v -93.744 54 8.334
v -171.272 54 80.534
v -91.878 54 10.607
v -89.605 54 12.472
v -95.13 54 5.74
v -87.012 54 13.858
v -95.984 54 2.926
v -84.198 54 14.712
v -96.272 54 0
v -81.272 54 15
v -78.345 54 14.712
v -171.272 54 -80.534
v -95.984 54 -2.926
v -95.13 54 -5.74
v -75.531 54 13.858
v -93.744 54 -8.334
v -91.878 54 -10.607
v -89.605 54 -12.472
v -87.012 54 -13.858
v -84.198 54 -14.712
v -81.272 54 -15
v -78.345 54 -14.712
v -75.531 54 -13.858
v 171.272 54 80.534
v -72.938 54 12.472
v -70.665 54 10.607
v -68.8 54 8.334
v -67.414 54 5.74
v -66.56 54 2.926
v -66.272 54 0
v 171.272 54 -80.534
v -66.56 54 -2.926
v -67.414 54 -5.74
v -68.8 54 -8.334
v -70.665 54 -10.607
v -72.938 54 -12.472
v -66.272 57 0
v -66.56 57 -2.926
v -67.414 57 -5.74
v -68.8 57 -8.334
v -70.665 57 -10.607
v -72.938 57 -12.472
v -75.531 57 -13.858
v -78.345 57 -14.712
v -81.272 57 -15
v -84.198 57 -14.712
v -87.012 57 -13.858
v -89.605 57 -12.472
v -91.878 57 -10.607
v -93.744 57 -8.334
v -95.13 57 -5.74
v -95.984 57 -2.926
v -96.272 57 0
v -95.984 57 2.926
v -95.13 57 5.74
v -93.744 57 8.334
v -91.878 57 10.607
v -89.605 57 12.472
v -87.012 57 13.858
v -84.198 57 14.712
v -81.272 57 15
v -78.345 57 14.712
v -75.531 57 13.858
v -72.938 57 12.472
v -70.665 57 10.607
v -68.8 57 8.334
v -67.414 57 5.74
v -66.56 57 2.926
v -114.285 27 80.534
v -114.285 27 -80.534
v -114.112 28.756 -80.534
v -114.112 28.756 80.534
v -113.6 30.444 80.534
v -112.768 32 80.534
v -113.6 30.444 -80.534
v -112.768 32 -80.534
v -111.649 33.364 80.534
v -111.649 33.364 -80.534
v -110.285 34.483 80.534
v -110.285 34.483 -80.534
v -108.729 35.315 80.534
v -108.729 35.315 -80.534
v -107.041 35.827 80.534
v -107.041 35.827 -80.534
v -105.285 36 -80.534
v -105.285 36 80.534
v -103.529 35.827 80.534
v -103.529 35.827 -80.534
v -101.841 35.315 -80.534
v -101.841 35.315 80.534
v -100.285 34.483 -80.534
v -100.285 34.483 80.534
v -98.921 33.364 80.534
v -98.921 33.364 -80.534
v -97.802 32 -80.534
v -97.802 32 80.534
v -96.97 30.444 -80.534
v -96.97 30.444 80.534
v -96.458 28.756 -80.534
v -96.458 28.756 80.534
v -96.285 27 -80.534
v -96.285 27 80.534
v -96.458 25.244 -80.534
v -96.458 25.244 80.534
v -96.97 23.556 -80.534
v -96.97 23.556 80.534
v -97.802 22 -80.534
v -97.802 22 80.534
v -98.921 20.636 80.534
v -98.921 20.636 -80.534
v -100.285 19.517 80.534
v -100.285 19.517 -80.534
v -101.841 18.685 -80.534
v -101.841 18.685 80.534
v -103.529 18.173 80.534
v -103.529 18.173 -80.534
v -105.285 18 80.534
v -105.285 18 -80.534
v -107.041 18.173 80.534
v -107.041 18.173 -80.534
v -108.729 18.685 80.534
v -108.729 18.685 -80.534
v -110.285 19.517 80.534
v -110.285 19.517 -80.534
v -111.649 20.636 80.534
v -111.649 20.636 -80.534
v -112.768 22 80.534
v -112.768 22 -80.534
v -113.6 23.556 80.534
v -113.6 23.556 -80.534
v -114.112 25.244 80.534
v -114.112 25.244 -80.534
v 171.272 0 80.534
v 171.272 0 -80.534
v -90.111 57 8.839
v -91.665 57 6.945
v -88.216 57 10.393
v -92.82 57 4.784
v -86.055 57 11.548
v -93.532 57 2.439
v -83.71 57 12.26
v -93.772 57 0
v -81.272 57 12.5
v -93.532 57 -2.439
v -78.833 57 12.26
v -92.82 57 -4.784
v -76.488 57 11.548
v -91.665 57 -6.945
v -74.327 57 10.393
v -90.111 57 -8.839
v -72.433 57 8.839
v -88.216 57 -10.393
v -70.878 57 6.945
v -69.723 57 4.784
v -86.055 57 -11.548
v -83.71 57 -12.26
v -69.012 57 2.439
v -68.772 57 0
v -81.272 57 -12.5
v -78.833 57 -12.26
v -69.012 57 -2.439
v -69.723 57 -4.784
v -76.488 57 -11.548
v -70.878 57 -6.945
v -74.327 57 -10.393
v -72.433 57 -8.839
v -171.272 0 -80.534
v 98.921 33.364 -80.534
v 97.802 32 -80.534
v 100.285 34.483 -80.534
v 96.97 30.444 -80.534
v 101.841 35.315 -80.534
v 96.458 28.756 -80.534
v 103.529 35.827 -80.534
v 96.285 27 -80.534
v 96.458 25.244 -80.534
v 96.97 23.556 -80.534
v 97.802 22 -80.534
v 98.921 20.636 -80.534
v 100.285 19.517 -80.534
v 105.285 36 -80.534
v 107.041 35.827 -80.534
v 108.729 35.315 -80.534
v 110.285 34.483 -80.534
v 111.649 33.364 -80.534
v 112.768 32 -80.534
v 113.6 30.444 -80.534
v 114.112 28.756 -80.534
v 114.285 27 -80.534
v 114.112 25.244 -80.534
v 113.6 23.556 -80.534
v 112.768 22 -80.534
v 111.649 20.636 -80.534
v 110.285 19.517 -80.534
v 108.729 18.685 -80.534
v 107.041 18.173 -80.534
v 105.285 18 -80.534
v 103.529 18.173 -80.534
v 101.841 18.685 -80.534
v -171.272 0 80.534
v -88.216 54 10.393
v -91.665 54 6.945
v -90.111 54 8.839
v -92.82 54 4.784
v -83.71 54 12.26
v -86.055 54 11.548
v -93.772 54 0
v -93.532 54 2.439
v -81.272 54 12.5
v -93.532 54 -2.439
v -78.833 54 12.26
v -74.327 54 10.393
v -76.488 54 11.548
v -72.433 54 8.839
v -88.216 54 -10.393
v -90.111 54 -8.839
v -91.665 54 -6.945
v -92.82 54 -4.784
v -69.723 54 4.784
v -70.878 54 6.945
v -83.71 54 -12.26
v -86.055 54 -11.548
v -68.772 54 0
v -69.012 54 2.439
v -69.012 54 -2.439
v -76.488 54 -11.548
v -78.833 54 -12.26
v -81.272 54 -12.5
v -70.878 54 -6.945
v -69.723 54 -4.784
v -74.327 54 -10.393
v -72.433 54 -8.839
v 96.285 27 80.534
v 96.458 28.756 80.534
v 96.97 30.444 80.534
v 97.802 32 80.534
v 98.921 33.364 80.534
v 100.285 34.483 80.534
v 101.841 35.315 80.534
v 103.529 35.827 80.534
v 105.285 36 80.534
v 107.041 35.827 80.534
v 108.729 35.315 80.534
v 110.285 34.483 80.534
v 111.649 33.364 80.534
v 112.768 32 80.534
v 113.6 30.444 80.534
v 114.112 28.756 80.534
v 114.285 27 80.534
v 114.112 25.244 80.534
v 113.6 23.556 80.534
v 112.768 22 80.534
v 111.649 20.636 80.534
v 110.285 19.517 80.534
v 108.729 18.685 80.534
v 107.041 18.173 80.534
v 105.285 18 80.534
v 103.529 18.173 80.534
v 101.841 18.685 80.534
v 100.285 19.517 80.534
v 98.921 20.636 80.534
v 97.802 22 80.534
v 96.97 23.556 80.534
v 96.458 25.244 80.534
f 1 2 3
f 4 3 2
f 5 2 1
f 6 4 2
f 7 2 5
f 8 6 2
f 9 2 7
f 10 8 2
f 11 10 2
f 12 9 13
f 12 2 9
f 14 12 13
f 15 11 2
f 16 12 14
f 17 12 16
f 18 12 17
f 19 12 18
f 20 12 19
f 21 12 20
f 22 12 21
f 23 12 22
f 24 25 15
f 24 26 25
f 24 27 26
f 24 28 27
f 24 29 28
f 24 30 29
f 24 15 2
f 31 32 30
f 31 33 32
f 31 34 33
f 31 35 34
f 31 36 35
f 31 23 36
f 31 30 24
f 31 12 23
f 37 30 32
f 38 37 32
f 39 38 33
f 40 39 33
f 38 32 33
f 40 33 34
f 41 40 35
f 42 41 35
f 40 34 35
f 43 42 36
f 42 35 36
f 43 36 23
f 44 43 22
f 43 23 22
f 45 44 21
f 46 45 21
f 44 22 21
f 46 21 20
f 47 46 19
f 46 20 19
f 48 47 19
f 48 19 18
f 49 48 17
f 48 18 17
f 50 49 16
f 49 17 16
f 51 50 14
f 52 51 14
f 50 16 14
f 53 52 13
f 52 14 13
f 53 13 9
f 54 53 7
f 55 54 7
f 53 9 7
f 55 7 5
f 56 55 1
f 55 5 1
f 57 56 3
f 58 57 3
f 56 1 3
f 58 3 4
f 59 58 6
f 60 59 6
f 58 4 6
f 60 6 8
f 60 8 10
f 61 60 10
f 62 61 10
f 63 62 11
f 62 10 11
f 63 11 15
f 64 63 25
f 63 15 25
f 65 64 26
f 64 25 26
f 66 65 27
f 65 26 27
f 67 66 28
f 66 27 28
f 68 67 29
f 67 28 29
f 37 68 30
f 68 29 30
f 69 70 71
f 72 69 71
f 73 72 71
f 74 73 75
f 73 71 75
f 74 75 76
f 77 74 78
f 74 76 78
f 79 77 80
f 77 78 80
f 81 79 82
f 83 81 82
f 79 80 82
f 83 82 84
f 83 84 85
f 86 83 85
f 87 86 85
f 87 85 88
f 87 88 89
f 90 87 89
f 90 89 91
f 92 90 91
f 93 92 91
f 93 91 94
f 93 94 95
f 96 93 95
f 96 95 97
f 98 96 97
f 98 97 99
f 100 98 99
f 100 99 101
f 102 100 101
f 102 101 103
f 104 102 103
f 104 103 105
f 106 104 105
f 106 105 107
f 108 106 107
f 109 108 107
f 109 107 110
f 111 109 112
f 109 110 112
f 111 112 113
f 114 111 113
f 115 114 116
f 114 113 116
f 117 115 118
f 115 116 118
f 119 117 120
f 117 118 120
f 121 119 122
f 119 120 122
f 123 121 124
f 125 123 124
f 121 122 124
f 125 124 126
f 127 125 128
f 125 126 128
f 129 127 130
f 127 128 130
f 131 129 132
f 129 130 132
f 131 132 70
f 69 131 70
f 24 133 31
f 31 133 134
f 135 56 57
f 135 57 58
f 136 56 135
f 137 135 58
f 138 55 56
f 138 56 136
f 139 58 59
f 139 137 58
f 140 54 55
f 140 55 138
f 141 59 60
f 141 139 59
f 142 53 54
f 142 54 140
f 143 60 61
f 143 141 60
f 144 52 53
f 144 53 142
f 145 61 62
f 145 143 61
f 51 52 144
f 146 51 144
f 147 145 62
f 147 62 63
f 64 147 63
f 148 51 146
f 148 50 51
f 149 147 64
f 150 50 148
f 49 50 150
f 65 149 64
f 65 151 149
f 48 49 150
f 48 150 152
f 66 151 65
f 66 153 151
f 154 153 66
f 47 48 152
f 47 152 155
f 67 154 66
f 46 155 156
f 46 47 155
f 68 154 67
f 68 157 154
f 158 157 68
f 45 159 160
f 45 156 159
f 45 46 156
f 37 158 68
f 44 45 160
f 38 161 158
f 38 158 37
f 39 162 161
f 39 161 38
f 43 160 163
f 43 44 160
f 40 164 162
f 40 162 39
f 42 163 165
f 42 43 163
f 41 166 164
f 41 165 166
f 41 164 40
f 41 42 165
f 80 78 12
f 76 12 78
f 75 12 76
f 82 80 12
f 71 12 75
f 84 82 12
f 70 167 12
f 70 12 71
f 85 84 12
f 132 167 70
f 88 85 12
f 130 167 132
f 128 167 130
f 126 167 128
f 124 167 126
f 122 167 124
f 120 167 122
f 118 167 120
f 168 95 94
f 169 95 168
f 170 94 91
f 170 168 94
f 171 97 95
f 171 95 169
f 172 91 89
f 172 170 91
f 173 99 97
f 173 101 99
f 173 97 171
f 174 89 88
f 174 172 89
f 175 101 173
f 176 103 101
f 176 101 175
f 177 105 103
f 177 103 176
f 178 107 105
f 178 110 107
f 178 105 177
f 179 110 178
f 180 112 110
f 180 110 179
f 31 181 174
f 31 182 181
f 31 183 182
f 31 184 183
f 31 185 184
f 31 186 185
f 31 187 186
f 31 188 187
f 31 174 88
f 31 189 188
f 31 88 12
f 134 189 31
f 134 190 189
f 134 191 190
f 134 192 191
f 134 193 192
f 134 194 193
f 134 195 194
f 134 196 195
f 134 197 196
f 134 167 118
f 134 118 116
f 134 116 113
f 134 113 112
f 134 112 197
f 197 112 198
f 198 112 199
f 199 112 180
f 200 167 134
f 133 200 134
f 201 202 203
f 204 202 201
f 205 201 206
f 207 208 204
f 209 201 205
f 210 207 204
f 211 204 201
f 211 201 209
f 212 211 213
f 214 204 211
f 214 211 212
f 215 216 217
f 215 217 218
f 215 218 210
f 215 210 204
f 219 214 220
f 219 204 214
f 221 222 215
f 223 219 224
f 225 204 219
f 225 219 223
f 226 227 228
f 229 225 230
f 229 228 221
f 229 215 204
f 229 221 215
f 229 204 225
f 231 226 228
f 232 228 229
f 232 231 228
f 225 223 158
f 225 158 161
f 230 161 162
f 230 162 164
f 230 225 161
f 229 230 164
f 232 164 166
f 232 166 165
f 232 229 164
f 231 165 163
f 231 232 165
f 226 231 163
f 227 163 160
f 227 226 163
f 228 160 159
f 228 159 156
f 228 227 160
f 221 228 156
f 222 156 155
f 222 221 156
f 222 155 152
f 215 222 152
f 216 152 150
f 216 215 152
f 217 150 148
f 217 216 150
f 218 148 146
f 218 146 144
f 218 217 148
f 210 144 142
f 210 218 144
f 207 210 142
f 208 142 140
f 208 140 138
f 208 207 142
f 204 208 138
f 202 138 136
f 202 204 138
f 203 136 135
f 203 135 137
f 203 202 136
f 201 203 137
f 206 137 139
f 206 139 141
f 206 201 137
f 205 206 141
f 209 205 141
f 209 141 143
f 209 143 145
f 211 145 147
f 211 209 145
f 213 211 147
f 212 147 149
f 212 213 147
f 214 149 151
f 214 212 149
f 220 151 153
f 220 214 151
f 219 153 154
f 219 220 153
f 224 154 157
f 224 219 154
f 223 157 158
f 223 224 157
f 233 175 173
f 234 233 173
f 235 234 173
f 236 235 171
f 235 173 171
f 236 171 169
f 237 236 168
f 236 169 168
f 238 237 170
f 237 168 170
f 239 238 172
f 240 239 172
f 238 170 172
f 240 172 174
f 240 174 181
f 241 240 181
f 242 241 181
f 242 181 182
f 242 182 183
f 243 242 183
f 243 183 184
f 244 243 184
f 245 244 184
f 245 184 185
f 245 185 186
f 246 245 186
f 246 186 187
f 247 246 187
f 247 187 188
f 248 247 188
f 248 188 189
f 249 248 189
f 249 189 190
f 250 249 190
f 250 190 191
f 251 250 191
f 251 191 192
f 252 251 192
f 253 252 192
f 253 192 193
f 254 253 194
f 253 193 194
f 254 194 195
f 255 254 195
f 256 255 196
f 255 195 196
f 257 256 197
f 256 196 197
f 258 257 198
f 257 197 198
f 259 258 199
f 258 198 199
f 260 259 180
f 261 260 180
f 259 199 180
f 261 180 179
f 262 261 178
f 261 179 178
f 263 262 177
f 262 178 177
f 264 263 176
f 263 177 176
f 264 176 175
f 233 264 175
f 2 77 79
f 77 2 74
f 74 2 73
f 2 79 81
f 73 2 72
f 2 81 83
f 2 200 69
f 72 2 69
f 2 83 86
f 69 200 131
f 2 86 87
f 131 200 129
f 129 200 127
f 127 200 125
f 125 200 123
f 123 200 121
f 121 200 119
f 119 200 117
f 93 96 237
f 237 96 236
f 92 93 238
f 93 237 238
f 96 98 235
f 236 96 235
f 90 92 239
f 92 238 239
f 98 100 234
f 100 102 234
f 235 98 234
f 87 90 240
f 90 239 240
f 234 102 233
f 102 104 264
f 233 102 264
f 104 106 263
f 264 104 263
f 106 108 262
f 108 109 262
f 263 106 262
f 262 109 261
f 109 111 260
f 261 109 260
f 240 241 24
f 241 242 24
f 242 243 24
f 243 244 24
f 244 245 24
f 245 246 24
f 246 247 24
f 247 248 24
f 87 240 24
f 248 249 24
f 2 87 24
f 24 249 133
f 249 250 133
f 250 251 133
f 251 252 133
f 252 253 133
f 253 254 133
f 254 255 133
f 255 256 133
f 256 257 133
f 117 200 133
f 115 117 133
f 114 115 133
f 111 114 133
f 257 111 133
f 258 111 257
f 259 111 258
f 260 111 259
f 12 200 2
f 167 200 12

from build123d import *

# Parameters (mm, degrees)
SKETCH1_W           = 342.543491
SKETCH1_H           = 161.067786
BOSS_EXTRUDE1_DEPTH = 54
SKETCH3_R           = 9
CUT_EXTRUDE1_DEPTH  = 340.02
SKETCH4_R           = 15
SKETCH4_R_2         = 12.5
BOSS_EXTRUDE2_DEPTH = 3


with BuildPart() as part:
    # Sketch1 → Boss-Extrude1 (new body)
    with BuildSketch(Plane(origin=(0, 0, 0), x_dir=(1, 0, 0), z_dir=(0, 1, 0))):
        Rectangle(SKETCH1_W, SKETCH1_H)
    extrude(amount=BOSS_EXTRUDE1_DEPTH)

    # Sketch3 → Cut-Extrude1 (cut)
    with BuildSketch(Plane(origin=(0, 0, -80.533893), x_dir=(-1, 0, 0), z_dir=(0, 0, -1))):
        with Locations((-105.2849429, 27)):
            Circle(SKETCH3_R)
        with Locations((105.2849429, 27)):
            Circle(SKETCH3_R)
    extrude(amount=-CUT_EXTRUDE1_DEPTH, mode=Mode.SUBTRACT)

    # Sketch4 → Boss-Extrude2 (add)
    with BuildSketch(Plane(origin=(0, 54, 0), x_dir=(1, 0, 0), z_dir=(0, 1, 0))):
        with Locations((-81.2717455, 0)):
            Circle(SKETCH4_R)
        with Locations((-81.2717455, 0)):
            Circle(SKETCH4_R_2, mode=Mode.SUBTRACT)
    extrude(amount=BOSS_EXTRUDE2_DEPTH)


solid = part.part
